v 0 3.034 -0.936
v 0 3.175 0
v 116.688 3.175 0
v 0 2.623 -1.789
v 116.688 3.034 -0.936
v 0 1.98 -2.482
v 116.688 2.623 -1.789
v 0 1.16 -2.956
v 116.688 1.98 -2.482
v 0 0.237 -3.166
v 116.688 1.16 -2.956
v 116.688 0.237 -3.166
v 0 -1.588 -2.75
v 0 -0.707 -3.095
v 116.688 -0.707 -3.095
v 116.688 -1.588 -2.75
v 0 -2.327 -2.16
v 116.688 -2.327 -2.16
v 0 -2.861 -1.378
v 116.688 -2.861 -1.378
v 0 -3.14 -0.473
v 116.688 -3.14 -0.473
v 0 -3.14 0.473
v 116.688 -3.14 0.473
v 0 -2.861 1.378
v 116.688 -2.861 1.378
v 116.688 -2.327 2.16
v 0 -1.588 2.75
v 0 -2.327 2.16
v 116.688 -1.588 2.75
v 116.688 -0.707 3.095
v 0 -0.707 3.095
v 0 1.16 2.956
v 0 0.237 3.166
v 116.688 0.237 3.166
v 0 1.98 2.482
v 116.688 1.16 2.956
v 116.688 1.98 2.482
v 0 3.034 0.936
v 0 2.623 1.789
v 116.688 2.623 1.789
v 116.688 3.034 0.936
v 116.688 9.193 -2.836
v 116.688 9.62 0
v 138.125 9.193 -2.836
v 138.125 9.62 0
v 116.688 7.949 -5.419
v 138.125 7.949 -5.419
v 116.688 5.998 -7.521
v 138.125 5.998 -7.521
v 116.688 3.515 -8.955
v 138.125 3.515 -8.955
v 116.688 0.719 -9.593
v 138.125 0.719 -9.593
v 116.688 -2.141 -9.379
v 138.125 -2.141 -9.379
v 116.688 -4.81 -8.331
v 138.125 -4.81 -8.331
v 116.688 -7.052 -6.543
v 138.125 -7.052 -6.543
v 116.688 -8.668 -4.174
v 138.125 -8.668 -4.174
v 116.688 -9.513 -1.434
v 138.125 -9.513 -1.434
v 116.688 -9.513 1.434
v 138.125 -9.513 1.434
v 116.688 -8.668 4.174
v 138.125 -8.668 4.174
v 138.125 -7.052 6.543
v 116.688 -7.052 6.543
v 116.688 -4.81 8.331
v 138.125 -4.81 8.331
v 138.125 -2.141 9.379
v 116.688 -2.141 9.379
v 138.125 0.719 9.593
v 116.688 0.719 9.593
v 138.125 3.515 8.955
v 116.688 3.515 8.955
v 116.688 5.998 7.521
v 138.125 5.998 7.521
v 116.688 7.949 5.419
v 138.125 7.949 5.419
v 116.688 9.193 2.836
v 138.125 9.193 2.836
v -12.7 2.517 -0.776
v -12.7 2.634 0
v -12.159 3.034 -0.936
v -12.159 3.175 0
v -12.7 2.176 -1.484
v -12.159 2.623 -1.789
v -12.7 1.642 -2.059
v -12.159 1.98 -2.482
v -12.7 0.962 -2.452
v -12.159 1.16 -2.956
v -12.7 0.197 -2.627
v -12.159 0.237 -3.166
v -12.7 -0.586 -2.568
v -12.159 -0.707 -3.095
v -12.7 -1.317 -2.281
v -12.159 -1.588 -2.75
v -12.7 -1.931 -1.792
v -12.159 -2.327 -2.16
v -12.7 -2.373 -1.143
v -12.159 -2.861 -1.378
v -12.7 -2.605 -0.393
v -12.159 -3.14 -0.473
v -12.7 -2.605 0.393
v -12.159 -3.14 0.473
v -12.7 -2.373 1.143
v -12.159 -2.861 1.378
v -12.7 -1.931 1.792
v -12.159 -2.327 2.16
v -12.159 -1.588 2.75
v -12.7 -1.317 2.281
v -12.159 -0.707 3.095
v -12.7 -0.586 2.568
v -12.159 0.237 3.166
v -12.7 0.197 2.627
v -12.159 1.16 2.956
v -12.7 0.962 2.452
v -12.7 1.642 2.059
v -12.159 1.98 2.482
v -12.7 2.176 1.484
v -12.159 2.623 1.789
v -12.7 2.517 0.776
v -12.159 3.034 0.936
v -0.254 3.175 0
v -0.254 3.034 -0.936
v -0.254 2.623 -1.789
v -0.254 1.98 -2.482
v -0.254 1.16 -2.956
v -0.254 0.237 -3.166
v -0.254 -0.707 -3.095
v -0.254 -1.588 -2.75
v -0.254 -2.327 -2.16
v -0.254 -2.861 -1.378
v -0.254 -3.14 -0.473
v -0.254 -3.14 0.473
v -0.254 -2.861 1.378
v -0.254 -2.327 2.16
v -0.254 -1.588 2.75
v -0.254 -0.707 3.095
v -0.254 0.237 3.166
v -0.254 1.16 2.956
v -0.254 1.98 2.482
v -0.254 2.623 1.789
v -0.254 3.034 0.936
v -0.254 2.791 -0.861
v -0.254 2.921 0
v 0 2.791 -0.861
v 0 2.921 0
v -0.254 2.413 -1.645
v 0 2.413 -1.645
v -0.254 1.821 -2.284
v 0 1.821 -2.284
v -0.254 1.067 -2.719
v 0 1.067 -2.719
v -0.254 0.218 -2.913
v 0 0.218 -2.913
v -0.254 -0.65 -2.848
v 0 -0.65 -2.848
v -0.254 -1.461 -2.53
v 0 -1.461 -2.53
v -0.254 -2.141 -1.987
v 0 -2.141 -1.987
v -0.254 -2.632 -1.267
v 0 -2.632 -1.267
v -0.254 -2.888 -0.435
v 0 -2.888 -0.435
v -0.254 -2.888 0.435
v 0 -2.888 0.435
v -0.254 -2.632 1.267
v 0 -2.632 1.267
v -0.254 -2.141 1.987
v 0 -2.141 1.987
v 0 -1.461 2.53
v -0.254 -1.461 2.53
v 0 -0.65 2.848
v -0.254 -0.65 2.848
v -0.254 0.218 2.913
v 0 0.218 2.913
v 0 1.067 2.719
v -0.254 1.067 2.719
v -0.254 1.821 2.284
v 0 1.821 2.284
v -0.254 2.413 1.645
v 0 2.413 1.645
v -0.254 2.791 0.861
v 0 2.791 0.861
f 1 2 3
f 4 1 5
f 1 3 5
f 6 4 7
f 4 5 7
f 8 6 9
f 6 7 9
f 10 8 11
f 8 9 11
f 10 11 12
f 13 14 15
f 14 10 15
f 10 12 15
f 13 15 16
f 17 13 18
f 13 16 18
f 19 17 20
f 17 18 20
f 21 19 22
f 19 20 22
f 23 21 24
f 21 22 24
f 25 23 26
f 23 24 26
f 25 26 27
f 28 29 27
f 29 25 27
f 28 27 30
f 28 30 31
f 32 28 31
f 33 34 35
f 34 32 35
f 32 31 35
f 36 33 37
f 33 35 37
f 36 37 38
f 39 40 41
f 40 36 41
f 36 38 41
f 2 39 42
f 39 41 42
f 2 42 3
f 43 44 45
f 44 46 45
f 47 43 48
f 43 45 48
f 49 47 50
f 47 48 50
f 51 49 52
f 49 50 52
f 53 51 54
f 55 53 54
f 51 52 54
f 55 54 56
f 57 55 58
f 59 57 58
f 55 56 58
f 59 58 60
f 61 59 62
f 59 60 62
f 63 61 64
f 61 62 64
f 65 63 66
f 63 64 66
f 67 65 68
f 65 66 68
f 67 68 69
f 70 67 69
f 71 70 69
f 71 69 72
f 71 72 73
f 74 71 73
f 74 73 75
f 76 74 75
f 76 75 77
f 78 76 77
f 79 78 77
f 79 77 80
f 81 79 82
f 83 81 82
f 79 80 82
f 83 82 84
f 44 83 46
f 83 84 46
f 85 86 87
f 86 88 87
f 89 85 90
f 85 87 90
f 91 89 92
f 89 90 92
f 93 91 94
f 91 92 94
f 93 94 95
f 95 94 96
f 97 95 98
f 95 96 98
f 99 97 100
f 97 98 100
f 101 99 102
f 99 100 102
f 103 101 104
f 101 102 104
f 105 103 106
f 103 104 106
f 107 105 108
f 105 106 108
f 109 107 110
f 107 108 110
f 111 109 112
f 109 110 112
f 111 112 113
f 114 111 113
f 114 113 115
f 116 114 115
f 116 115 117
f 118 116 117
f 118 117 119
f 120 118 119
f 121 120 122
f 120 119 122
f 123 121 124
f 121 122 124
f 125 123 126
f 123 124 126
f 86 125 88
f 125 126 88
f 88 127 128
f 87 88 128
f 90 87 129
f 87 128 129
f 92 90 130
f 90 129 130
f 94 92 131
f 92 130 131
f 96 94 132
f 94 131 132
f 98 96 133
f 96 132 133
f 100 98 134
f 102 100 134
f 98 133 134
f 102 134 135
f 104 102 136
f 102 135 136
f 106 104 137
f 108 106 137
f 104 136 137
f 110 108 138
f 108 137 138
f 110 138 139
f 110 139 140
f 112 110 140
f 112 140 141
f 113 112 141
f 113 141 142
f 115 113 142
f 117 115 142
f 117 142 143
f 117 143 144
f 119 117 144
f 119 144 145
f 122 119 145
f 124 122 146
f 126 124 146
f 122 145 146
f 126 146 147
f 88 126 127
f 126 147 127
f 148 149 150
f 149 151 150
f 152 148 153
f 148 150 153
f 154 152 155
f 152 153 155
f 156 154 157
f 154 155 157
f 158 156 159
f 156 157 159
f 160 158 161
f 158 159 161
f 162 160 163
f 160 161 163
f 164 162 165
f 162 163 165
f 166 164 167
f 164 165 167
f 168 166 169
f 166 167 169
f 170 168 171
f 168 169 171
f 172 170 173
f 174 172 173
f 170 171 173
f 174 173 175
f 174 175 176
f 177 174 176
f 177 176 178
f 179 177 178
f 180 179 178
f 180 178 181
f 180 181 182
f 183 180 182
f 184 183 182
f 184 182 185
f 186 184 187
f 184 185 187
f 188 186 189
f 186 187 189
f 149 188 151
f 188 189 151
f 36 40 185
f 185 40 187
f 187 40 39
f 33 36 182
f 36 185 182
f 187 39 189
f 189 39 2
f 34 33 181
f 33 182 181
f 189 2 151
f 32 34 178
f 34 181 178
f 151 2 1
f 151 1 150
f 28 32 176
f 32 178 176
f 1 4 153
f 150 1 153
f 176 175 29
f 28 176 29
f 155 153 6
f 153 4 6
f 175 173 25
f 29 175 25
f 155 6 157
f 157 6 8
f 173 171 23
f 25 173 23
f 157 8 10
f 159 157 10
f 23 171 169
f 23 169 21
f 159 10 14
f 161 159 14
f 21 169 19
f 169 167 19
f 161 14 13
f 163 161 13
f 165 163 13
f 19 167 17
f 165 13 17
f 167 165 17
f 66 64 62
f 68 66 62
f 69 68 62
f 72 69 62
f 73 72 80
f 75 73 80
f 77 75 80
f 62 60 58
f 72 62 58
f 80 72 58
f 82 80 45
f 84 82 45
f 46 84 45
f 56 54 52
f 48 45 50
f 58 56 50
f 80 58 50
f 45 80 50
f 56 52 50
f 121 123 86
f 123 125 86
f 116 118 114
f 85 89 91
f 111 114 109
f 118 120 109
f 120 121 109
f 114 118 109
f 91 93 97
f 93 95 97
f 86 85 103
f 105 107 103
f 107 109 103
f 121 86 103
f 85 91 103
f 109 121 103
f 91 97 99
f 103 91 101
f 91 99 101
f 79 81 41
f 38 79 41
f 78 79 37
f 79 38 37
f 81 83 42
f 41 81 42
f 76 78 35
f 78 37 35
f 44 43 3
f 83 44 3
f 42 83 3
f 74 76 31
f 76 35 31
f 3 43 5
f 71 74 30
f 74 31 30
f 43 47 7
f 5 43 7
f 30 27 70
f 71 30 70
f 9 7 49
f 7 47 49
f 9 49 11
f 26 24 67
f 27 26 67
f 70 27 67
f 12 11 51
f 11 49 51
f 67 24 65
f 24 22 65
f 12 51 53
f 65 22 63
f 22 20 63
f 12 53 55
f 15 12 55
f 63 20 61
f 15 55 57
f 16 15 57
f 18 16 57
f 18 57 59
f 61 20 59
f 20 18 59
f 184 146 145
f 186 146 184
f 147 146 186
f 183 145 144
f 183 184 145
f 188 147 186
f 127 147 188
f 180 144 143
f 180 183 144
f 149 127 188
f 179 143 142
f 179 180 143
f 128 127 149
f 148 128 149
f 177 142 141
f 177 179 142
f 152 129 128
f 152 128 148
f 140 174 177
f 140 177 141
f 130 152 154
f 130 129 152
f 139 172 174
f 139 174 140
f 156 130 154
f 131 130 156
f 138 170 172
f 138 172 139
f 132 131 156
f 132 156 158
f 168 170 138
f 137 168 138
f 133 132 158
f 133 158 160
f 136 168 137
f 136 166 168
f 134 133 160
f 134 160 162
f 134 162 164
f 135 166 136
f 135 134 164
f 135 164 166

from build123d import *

# Parameters (mm, degrees)
SKETCH3_W = 0.254
SKETCH3_H = 0.508


with BuildPart() as part:
    # Sketch1 → Revolve1 (revolve)
    with BuildSketch(Plane.XY):
        Polygon((0, 0), (0, 3.175), (116.6876, 3.175), (116.6876, 9.62025), (138.1252, 9.62025), (138.1252, 0), align=None)
    revolve(axis=Axis((138.1252, 0, 0), (-1, 0, 0)))

    # Sketch2 → Revolve2 (revolve)
    with BuildSketch(Plane.XY):
        Polygon((-12.7, 0), (-12.7, 2.63398), (-12.15898, 3.175), (0, 3.175), (0, 0), align=None)
    revolve(axis=Axis((0, 0, 0), (-1, 0, 0)))

    # Sketch3 → Cut-Revolve1 (revolve, cut)
    with BuildSketch(Plane.XY):
        with Locations((-0.127, 3.175)):
            Rectangle(SKETCH3_W, SKETCH3_H)
    revolve(axis=Axis((0, 0, 0), (-1, 0, 0)), mode=Mode.SUBTRACT)


solid = part.part
